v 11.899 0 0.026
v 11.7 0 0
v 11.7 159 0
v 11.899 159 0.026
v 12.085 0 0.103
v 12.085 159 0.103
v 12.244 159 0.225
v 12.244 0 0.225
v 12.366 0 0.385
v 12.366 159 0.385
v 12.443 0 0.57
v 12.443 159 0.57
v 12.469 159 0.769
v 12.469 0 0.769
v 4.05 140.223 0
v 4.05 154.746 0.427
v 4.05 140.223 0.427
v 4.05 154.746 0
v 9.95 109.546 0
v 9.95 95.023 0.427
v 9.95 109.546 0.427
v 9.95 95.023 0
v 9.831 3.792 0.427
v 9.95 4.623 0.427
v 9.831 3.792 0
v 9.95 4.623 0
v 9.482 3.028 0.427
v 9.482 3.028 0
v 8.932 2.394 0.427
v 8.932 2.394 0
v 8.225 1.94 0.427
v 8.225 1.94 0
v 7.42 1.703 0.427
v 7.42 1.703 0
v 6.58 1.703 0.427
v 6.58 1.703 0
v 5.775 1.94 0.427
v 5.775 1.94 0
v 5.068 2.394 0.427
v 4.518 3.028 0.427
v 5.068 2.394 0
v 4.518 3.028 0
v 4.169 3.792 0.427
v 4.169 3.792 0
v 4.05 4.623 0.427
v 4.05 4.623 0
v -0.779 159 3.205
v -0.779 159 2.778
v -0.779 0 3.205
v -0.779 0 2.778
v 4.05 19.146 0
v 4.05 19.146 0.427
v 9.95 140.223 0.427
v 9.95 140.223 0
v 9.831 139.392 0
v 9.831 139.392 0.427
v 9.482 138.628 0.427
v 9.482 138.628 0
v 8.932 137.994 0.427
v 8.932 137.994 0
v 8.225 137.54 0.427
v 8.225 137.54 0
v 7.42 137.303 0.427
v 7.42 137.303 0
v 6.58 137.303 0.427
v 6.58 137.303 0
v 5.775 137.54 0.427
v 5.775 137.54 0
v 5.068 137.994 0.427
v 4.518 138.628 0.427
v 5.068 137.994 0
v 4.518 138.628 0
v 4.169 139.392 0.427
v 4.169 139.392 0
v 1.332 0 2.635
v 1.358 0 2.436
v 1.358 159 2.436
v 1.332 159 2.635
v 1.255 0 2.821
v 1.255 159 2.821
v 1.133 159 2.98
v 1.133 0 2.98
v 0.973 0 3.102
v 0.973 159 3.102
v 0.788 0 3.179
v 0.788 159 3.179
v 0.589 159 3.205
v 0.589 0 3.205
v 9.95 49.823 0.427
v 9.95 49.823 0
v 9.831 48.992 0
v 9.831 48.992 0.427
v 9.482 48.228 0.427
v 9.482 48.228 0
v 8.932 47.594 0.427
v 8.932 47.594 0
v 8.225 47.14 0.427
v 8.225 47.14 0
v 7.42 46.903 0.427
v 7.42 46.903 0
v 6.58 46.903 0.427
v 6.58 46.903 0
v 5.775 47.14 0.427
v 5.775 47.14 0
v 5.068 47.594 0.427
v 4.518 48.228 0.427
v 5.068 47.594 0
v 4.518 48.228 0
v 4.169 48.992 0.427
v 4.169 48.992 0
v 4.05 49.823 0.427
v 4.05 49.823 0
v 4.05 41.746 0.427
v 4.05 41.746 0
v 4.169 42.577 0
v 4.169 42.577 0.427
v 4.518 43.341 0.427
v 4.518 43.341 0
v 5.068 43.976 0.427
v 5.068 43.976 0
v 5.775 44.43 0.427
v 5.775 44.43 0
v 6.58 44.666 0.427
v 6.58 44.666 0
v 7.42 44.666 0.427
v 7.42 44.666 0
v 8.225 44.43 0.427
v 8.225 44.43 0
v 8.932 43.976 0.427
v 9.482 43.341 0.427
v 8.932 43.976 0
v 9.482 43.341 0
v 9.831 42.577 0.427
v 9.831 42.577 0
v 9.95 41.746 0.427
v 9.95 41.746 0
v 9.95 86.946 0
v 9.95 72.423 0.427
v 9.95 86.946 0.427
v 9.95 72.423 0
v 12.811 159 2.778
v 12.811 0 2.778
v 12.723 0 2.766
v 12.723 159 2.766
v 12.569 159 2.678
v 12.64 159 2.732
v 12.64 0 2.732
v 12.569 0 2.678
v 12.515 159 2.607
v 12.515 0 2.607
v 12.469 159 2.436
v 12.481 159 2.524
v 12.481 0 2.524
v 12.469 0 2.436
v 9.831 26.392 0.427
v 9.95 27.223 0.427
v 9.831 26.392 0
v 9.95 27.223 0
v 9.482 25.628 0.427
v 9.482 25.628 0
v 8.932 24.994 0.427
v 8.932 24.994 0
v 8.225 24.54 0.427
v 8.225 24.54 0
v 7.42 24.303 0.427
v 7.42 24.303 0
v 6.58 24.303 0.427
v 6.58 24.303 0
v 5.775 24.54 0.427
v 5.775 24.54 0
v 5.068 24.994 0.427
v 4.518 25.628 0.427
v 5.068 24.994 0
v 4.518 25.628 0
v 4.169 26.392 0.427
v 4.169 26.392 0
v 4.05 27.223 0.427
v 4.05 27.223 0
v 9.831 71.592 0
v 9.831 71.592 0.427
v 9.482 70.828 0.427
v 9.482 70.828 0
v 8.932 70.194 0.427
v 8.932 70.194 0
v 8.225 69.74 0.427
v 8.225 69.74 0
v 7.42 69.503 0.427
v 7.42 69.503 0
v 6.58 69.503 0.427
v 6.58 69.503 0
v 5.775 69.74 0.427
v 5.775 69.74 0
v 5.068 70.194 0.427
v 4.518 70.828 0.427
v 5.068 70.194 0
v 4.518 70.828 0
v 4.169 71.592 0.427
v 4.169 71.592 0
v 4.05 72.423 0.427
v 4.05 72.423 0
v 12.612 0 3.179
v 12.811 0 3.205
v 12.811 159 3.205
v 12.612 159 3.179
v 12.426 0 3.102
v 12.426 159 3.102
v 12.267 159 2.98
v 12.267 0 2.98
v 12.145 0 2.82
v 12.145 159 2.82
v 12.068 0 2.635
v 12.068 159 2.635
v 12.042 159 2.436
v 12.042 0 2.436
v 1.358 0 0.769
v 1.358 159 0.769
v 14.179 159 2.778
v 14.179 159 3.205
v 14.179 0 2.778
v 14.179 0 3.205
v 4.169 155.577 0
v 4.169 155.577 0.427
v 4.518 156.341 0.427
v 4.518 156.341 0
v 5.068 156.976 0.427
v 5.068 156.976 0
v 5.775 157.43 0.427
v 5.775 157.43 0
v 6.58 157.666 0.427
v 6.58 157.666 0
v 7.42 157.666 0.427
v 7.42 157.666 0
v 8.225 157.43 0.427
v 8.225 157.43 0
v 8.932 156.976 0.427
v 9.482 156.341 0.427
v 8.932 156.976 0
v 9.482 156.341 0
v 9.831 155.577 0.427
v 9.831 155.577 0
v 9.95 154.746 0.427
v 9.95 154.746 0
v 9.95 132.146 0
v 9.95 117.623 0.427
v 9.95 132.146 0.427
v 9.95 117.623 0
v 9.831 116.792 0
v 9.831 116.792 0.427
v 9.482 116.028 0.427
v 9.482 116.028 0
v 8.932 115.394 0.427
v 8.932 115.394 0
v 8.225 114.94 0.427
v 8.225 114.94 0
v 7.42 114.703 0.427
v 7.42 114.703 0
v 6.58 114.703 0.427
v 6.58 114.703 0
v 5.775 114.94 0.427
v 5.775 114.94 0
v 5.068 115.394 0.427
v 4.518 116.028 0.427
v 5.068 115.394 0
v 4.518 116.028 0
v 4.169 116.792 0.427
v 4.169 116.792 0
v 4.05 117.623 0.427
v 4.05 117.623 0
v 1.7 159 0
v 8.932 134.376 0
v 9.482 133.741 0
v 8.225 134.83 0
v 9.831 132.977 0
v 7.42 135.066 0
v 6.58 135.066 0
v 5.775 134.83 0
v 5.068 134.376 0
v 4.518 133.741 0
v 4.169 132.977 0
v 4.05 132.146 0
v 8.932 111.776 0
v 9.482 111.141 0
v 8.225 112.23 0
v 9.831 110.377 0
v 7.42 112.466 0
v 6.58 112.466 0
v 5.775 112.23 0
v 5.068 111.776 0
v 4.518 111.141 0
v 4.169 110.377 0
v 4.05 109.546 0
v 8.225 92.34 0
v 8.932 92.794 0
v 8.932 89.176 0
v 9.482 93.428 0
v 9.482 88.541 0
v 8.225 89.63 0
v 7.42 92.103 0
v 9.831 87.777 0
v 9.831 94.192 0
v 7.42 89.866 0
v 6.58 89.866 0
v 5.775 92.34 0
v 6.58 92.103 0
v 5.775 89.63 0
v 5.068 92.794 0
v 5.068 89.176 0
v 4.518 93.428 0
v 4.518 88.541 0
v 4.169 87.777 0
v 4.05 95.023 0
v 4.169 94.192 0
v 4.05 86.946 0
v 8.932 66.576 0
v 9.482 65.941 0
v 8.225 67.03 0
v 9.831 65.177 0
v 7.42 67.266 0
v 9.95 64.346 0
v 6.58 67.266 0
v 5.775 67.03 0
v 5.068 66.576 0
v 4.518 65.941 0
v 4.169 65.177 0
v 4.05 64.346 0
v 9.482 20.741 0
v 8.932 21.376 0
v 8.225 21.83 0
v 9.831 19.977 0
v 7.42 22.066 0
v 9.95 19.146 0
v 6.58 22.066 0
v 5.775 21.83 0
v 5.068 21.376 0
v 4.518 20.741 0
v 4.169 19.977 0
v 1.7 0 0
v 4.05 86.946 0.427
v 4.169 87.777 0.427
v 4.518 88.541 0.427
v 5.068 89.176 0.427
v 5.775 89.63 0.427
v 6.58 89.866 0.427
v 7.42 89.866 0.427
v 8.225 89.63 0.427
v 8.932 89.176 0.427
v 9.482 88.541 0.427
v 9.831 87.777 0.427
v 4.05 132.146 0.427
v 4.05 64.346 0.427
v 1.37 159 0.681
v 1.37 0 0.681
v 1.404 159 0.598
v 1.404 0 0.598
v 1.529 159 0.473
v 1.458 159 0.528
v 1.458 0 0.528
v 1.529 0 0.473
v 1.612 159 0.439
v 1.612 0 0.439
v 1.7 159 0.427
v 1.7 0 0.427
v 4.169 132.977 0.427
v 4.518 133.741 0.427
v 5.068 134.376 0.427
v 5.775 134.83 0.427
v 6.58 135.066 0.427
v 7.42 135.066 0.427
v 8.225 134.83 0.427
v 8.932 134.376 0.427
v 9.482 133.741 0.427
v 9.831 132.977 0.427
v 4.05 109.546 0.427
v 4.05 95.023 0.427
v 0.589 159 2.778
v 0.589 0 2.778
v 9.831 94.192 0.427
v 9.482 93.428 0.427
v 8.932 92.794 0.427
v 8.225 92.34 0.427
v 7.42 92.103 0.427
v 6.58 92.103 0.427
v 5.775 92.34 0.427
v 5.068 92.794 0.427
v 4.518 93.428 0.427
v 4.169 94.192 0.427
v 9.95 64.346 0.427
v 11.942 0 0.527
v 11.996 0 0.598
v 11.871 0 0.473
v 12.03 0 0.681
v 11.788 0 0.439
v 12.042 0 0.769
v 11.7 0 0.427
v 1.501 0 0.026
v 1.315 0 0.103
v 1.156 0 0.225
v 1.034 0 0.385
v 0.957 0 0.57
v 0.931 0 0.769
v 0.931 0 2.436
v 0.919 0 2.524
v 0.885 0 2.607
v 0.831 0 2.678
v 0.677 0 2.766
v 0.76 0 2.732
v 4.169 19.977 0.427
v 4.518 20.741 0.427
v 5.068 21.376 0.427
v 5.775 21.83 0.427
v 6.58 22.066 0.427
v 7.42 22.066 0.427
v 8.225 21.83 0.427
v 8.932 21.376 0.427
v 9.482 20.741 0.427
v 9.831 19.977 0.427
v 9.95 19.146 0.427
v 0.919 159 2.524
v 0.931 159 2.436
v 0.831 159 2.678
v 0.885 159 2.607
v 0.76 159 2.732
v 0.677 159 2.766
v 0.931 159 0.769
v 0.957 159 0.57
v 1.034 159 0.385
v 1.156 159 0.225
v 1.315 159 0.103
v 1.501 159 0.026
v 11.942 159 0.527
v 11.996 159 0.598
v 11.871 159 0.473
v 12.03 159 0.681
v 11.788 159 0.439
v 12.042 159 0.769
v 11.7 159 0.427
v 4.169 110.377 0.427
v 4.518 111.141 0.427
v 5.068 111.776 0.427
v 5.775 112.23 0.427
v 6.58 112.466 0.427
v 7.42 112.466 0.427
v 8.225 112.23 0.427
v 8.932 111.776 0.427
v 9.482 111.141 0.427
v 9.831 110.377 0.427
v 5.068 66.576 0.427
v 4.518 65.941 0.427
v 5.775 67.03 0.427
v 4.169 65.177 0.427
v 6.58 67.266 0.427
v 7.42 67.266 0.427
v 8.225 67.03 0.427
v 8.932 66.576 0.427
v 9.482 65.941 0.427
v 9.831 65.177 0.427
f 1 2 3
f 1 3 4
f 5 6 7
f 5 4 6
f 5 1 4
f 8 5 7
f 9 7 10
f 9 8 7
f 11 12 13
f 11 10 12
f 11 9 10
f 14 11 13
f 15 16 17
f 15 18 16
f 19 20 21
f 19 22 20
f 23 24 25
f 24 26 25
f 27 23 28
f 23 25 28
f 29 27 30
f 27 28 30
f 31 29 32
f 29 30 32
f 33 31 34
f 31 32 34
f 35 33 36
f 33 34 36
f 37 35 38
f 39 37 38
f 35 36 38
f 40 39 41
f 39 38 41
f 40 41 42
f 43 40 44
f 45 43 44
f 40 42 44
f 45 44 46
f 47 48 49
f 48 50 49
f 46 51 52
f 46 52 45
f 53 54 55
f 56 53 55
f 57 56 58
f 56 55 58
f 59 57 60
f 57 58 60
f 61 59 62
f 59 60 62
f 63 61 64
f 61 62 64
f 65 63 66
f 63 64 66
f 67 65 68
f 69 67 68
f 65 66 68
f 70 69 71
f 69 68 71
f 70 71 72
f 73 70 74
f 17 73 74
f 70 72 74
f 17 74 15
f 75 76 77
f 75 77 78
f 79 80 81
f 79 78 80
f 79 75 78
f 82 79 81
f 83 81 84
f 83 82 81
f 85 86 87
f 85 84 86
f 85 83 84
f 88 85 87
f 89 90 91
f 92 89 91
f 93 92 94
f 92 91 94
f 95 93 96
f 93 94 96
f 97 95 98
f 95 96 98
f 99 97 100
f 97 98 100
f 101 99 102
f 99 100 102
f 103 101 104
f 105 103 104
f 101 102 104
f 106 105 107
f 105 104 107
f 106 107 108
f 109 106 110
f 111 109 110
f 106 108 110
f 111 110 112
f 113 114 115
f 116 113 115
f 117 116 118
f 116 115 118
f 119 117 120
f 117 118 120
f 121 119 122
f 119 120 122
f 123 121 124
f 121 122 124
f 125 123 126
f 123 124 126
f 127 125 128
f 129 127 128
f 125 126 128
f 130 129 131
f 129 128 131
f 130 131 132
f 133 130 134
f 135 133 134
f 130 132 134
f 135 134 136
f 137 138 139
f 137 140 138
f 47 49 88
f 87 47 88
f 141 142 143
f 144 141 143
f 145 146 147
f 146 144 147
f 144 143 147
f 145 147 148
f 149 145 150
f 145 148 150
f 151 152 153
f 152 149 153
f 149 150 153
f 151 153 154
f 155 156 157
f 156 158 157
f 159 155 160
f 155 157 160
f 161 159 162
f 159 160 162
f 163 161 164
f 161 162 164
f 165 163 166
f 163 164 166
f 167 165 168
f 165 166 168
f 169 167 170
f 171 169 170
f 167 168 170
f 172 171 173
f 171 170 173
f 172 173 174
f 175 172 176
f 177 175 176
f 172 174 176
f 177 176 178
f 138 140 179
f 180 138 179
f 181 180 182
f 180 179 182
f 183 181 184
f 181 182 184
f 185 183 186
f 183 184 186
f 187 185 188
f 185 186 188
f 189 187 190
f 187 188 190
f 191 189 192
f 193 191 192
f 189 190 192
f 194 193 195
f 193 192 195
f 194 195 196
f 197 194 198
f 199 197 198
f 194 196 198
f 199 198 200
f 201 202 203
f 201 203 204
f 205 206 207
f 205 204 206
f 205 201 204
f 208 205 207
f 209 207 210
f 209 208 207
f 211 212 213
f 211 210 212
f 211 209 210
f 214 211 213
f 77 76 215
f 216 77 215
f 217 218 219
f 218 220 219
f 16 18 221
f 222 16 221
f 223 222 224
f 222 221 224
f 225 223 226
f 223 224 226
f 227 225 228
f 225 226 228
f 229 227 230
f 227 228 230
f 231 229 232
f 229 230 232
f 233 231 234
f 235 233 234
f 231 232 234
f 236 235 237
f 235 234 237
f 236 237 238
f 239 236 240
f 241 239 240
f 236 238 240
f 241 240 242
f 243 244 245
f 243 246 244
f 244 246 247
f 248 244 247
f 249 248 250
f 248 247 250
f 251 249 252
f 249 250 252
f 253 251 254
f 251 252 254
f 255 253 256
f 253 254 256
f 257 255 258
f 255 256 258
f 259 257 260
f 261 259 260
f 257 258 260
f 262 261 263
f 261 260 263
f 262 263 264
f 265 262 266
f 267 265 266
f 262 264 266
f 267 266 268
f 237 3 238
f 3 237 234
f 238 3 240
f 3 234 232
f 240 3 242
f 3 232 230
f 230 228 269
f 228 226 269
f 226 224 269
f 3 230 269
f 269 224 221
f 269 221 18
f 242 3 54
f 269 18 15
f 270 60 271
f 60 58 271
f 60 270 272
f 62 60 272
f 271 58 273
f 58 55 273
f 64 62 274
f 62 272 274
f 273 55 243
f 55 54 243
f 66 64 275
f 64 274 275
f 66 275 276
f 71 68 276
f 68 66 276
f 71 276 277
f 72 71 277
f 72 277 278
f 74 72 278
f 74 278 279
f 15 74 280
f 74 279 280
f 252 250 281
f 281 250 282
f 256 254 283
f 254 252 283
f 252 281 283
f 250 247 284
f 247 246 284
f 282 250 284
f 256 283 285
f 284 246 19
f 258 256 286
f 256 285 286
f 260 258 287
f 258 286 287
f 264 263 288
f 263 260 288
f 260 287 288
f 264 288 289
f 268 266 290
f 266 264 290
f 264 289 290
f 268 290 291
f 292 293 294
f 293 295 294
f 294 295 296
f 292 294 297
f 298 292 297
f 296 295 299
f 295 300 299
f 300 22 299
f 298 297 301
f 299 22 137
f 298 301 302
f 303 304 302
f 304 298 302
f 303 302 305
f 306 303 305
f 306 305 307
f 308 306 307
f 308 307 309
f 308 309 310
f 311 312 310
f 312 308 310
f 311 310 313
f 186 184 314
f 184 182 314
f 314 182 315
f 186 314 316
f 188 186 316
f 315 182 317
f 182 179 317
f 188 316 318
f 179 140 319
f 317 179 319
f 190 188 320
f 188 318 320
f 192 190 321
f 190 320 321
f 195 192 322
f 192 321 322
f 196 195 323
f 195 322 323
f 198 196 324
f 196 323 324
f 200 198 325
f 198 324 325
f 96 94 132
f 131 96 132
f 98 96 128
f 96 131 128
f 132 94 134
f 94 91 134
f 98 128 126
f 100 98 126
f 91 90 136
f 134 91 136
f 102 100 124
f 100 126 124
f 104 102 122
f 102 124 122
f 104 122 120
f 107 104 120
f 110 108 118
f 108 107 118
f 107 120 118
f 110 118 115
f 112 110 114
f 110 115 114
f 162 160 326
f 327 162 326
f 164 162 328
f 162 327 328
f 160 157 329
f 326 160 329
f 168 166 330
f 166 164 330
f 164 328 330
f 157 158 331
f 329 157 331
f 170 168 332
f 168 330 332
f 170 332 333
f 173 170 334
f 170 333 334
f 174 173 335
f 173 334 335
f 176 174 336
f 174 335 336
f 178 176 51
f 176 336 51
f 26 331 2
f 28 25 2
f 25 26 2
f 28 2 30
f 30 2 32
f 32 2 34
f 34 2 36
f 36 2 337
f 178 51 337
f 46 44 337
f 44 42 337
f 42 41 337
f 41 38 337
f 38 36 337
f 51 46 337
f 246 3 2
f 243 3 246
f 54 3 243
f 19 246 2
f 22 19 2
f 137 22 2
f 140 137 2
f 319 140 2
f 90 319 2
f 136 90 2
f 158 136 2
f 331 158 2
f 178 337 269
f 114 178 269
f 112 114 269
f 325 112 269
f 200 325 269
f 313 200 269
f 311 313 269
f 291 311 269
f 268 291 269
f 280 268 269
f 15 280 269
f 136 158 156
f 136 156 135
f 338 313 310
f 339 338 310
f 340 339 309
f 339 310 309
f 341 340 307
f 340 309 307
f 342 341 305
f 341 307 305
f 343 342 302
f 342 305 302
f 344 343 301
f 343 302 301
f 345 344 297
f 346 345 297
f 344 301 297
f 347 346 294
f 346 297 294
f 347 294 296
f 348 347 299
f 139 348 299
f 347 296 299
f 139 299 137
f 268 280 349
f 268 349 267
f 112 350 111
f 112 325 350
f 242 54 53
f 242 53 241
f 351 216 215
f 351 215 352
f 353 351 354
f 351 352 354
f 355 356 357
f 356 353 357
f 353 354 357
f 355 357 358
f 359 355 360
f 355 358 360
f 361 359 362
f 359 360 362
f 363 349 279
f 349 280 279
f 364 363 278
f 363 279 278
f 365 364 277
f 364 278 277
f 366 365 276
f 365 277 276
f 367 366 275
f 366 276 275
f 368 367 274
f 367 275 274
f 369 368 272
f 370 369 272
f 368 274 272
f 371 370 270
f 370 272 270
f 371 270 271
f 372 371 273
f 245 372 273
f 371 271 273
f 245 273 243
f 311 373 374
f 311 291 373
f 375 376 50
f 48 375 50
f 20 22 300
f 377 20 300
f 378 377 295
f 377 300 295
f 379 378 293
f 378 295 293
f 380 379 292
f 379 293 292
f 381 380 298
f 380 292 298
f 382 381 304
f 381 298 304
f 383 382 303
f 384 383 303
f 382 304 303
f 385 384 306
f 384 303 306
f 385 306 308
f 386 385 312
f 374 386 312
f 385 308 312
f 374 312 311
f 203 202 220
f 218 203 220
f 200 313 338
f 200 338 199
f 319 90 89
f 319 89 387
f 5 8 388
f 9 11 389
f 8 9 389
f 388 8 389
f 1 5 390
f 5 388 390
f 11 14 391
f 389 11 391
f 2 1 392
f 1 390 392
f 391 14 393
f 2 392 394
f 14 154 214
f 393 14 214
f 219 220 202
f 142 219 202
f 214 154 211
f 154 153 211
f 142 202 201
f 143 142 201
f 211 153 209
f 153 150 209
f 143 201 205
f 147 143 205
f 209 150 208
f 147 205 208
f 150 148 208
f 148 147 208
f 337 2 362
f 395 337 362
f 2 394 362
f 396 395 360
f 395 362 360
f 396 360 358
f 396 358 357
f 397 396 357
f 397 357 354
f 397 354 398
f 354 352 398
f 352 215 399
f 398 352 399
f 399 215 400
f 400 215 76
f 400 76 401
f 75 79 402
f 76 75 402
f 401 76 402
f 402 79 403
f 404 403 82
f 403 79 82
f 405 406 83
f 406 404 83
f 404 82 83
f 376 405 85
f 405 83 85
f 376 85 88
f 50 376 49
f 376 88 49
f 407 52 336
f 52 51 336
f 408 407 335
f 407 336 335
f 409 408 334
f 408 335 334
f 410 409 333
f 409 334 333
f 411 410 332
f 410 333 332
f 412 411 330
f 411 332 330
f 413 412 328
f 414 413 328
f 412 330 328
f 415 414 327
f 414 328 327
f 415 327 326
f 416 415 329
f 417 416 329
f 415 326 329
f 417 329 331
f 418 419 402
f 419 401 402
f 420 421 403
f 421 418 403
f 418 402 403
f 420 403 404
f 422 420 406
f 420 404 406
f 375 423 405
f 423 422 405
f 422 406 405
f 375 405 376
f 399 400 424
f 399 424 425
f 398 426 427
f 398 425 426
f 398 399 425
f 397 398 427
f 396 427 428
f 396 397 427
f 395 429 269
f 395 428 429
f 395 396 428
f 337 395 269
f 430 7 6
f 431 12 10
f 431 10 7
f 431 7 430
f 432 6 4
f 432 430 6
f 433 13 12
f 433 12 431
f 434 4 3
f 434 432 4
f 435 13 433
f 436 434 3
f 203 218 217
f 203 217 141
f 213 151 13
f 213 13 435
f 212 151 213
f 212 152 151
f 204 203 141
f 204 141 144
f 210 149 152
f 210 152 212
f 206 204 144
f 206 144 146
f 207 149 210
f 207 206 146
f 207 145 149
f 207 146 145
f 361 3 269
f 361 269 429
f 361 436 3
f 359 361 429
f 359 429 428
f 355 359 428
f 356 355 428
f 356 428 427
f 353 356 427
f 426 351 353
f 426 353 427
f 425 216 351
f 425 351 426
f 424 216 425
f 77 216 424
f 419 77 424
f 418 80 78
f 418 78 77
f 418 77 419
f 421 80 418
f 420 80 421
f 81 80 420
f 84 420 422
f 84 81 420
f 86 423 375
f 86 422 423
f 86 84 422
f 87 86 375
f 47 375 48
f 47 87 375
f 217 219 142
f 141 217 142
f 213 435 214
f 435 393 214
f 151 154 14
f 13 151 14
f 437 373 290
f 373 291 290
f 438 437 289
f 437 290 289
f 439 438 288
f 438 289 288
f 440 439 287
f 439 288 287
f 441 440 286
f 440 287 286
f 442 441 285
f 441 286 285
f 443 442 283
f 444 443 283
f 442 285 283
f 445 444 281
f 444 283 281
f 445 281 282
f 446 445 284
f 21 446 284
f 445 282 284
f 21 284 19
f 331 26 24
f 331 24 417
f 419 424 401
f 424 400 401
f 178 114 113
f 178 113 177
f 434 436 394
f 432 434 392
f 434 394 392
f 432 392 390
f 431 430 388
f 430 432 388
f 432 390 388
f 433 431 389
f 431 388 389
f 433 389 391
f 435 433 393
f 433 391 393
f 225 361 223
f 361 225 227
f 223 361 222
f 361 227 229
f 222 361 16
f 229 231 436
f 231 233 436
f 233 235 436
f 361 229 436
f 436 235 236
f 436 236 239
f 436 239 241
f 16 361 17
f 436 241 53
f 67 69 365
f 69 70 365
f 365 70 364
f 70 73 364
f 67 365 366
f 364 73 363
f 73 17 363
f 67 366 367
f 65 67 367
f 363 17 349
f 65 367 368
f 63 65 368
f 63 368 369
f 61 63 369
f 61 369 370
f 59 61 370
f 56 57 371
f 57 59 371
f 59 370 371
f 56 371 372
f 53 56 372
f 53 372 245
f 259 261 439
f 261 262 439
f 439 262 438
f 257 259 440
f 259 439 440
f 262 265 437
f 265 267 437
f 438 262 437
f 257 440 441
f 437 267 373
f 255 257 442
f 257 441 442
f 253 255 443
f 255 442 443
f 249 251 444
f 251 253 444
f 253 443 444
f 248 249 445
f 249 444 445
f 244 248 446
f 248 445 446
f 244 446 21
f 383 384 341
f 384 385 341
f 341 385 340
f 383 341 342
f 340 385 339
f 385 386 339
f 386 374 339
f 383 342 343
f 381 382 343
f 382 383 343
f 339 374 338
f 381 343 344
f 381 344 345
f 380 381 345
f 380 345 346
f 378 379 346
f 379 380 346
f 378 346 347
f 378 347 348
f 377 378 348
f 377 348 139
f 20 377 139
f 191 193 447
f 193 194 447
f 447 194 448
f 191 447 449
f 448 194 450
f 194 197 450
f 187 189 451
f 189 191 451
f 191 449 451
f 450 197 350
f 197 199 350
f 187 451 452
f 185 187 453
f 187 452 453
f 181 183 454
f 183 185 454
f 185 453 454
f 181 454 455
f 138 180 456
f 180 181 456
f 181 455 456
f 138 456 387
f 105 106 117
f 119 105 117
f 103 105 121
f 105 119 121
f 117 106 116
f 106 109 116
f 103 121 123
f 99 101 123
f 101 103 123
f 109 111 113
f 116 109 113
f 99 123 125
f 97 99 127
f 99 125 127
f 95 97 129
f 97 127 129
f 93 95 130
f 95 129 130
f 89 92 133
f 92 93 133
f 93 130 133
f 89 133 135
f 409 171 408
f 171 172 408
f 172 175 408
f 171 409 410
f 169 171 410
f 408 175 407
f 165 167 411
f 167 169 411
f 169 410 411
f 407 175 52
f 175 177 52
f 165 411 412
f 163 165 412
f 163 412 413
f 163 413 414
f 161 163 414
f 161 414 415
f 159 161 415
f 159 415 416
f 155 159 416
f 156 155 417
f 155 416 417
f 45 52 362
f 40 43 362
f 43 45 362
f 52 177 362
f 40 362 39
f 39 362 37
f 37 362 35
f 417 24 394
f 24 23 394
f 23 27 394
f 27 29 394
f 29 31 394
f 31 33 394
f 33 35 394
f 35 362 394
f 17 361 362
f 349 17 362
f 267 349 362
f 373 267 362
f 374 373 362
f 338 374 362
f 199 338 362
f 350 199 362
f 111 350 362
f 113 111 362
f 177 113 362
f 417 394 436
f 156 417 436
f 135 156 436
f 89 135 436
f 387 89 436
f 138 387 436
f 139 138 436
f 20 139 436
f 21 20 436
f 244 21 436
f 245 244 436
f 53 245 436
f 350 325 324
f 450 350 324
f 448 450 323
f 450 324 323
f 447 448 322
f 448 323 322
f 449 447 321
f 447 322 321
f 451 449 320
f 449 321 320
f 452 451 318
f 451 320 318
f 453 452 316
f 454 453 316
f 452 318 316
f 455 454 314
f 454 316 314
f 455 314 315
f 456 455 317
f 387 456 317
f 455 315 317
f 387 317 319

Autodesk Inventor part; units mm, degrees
sketch "Sketch_2" plane through (0, 0, 0) normal (0, 1, 0) x (-1, 0, 0)
  line L0 (0.7786, 2.7778) -> (0.7786, 3.2051)
  line L1 (0.7786, 3.2051) -> (-0.5889, 3.2051)
  arc A0 (-0.5889, 3.2051) -> (-1.3581, 2.4359) centre (-0.5889, 2.4359) ccw
  line L2 (-1.3581, 2.4359) -> (-1.3581, 0.7692)
  arc A1 (-1.7, 0.4274) -> (-1.3581, 0.7692) centre (-1.7, 0.7692) ccw
  line L3 (-1.7, 0.4274) -> (-11.7, 0.4274)
  arc A2 (-12.0419, 0.7692) -> (-11.7, 0.4274) centre (-11.7, 0.7692) ccw
  line L4 (-12.0419, 0.7692) -> (-12.0419, 2.4359)
  arc A3 (-12.0419, 2.4359) -> (-12.8111, 3.2051) centre (-12.8111, 2.4359) ccw
  line L5 (-12.8111, 3.2051) -> (-14.1786, 3.2051)
  line L6 (-14.1786, 3.2051) -> (-14.1786, 2.7778)
  line L7 (-14.1786, 2.7778) -> (-12.8111, 2.7778)
  arc A4 (-12.4692, 2.4359) -> (-12.8111, 2.7778) centre (-12.8111, 2.4359) ccw
  line L8 (-12.4692, 2.4359) -> (-12.4692, 0.7692)
  arc A5 (-12.4692, 0.7692) -> (-11.7, 0) centre (-11.7, 0.7692) ccw
  line L9 (-11.7, 0) -> (-1.7, 0)
  arc A6 (-1.7, 0) -> (-0.9308, 0.7692) centre (-1.7, 0.7692) ccw
  line L10 (-0.9308, 0.7692) -> (-0.9308, 2.4359)
  arc A7 (-0.5889, 2.7778) -> (-0.9308, 2.4359) centre (-0.5889, 2.4359) ccw
  line L11 (-0.5889, 2.7778) -> (0.7786, 2.7778)
  dimension "d14" = 10
extrude "Extrusion1" add sketch "Sketch_2" along normal blind 159
sketch "Sketch_6" plane through (0, 0, 0) normal (0, 0, 1) x (1, 0, 0)
  arc A0 (4.05, 4.6232) -> (9.95, 4.6232) centre (7, 4.6232) ccw
  line L0 (9.95, 4.6232) -> (9.95, 19.1463)
  arc A1 (9.95, 19.1463) -> (4.05, 19.1463) centre (7, 19.1463) ccw
  line L1 (4.05, 19.1463) -> (4.05, 4.6232)
  dimension "d13" = 2.95
extrude "Extrusion2" cut sketch "Sketch_6" along normal blind 2
pattern_linear "Rectangular Pattern1" count 80 spacing 22.6 along (0, 1, 0) of "Extrusion2"
properties part number "PP0735H(1)" material "Ouro"
